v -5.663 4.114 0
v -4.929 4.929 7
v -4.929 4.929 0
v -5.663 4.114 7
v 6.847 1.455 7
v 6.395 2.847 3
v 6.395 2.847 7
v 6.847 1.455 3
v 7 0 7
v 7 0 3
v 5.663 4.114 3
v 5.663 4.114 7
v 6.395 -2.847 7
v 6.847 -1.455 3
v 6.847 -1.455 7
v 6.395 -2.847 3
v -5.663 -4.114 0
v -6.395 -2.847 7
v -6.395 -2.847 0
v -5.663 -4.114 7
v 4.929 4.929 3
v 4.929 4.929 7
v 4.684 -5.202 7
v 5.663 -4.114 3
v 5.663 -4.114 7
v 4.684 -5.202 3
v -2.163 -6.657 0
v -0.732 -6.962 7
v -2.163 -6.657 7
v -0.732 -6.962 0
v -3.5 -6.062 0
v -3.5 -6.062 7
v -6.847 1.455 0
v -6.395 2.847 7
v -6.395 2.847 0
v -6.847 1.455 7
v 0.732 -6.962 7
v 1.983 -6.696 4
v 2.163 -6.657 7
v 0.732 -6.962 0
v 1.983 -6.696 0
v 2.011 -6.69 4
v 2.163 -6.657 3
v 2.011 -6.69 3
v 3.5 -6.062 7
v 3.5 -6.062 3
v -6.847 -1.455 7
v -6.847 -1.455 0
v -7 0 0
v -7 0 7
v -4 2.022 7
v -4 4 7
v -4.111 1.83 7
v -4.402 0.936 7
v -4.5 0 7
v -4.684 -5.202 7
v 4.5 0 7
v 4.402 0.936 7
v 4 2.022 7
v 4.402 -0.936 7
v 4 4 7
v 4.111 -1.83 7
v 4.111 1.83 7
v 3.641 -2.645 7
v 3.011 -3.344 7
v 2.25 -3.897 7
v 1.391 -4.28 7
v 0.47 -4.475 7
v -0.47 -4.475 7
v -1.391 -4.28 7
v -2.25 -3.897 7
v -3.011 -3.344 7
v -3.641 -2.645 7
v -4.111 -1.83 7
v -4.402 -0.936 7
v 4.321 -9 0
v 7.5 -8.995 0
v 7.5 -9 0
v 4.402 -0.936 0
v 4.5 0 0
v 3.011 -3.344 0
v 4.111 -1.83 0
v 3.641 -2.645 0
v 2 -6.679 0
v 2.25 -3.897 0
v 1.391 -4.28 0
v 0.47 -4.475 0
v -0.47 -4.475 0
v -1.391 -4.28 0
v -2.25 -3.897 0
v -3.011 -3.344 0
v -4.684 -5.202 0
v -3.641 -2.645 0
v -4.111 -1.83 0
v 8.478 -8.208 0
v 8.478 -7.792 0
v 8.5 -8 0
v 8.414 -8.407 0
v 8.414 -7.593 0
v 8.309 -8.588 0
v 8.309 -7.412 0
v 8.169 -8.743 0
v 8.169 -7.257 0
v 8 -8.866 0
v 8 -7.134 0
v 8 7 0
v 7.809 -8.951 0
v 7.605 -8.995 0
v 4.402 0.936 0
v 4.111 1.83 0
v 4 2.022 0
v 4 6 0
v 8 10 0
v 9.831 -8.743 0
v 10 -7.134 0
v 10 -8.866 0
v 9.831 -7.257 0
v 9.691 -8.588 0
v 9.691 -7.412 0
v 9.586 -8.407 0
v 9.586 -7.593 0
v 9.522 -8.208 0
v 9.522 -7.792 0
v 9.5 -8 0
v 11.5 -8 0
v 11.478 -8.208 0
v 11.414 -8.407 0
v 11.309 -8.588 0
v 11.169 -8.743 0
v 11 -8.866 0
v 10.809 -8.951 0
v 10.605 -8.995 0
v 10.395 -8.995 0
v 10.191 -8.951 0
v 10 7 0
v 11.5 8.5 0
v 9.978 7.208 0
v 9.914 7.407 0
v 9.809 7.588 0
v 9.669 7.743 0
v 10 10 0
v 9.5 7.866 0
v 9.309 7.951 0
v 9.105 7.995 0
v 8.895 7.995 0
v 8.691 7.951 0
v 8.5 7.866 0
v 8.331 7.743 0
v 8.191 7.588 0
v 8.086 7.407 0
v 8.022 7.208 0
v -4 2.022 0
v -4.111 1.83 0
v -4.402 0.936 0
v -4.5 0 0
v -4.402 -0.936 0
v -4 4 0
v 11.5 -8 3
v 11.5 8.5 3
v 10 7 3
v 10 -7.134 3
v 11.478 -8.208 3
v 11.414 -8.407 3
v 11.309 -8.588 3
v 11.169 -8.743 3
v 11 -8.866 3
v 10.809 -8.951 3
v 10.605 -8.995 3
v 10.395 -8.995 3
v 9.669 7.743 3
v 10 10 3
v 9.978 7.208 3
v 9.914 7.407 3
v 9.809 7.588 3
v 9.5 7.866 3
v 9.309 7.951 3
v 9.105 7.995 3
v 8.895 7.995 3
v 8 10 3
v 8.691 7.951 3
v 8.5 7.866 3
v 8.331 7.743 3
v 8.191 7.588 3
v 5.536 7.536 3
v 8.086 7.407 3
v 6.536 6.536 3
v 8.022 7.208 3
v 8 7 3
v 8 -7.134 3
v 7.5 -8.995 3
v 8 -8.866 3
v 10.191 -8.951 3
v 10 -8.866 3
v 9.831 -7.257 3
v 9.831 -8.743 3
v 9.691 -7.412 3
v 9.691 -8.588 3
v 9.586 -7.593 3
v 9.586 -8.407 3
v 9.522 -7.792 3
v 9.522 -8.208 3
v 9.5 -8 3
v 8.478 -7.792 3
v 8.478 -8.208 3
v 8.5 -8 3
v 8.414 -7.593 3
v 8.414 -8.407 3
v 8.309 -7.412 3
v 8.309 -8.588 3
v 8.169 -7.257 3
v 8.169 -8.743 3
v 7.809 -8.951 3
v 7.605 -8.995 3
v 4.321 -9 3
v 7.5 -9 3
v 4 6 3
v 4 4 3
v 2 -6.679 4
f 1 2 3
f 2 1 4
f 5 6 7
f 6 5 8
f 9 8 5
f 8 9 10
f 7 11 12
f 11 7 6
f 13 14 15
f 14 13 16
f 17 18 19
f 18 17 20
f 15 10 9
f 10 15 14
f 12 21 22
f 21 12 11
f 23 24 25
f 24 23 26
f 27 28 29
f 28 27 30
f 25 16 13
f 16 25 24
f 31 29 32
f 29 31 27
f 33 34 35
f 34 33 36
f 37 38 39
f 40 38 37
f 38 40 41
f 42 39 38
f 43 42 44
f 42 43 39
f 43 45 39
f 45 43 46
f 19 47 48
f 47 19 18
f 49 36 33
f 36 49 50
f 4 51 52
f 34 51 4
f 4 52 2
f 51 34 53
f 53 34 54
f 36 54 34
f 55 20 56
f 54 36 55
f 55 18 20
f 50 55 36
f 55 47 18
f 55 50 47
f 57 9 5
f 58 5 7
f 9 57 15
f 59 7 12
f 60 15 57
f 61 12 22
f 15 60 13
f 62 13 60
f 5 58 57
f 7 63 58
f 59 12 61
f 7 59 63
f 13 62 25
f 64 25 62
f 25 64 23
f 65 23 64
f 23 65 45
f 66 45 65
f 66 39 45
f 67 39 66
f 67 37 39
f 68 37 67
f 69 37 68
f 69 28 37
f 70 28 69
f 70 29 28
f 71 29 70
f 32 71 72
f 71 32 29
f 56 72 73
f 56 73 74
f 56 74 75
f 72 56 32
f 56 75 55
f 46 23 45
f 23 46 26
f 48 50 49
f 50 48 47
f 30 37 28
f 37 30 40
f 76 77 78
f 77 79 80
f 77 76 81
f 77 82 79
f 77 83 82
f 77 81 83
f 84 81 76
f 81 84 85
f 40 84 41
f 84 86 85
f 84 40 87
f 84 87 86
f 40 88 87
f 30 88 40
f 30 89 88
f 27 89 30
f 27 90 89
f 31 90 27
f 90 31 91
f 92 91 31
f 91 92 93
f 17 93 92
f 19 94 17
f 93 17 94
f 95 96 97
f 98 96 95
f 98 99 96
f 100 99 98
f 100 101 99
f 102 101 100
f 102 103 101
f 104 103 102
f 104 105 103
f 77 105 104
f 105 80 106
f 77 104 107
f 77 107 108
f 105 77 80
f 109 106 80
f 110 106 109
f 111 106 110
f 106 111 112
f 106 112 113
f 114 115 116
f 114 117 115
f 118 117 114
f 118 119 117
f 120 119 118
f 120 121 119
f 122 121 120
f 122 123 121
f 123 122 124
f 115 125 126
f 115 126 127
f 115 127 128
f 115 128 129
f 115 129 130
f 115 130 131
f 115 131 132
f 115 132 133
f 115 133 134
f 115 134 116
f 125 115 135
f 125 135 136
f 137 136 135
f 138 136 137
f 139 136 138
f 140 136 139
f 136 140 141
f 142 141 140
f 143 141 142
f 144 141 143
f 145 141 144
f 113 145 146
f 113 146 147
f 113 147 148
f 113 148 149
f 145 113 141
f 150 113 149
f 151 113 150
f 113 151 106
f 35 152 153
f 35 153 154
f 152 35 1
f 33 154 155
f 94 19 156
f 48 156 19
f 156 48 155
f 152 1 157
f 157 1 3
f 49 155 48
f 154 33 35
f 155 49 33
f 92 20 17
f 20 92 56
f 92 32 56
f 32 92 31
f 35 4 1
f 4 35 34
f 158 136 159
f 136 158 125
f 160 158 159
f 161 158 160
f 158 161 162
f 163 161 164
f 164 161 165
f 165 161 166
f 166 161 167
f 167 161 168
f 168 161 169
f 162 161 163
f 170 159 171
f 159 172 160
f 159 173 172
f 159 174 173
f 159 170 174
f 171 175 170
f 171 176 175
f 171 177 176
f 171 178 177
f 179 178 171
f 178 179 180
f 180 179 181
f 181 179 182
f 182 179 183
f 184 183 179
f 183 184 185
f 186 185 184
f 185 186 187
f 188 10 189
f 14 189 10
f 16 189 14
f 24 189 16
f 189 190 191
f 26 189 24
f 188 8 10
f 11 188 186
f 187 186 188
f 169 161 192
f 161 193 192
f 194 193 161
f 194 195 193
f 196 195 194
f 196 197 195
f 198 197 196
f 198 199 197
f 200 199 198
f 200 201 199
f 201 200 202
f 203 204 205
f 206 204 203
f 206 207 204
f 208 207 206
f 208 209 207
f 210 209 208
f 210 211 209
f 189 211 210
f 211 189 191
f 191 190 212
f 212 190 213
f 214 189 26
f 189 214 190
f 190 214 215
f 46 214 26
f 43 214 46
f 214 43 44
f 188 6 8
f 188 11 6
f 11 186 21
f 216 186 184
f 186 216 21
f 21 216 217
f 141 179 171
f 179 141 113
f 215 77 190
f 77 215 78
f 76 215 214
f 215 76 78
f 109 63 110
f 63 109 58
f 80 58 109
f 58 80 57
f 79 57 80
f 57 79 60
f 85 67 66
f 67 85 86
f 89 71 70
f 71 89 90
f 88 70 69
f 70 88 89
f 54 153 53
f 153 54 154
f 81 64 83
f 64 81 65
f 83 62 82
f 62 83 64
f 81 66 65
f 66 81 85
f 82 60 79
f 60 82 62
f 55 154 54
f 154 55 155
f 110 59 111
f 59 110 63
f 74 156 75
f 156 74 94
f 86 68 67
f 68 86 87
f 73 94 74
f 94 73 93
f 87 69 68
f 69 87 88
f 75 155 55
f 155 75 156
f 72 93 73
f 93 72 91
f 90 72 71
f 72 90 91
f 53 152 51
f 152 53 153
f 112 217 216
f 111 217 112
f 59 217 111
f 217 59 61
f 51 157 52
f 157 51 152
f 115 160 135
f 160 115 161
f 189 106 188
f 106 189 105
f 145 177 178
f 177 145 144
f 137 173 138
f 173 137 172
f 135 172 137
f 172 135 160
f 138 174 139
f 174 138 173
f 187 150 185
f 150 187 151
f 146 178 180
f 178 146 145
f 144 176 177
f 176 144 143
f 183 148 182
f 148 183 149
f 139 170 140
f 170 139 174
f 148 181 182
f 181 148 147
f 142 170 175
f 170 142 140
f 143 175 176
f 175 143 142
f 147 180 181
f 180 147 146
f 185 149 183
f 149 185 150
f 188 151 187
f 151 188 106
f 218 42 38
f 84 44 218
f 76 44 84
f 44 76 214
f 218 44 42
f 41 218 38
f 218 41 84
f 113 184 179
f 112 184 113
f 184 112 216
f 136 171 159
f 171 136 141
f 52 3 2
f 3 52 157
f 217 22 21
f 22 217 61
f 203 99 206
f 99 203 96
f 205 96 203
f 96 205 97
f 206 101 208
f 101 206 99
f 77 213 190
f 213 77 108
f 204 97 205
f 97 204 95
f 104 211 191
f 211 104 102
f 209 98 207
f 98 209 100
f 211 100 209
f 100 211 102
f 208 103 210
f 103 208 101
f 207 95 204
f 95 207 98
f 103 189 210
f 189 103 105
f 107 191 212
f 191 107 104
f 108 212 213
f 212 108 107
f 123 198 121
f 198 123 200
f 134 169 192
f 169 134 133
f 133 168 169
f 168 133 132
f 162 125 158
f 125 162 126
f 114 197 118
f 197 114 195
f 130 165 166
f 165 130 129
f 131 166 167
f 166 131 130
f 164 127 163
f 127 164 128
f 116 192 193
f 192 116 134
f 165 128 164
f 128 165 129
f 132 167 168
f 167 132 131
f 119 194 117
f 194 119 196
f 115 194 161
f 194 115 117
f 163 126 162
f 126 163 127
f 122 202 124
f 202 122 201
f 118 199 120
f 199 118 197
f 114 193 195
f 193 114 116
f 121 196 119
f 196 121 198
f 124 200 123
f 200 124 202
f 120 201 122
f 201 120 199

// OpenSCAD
// PRUSA iteration3
// LCD cable clip
// GNU GPL v3
// Josef Průša <iam@josefprusa.cz> and contributors
// http://www.reprap.org/wiki/Prusa_Mendel
// http://prusamendel.org

isMetric=false;

difference(){
    union(){
    cylinder(r=7,h = 7, $fn=30);
    translate([2,-8,0]) cube([9.5,18,3]);
    translate([2,-9,0]) cube([5.5,5,3]);
    }
if(isMetric) {
  translate([0,0,-1]) cylinder(r=5,h = 10, $fn=30);
  translate([-4.5,0,-5]) cube([9,15,15]);
} else {
  translate([0,0,-1]) cylinder(r=4.5,h = 10, $fn=30);
  translate([-4,0,-5]) cube([8,15,15]);
}
translate([8,-12,-1]) cube([2,19,5]);
translate([9,7,-1]) cylinder(r=1,h = 5, $fn=30);
    
    //corners
    translate([2,-13.75,-1]) rotate([0,0,45]) cube([5,5,5]);    
    
    translate([4,6,-1]) rotate([0,0,45]) cube([10,10,5]);    
    translate([14,6,-1]) rotate([0,0,45]) cube([10,10,5]);    
    translate([-3,3,-1]) rotate([0,0,45]) cube([5,5,10]);    
    translate([3,3,3]) rotate([0,0,45]) cube([5,5,10]);    
}


translate([7.5,-8,0]) cylinder(r=1,h = 3, $fn=30);
translate([10.5,-8,0]) cylinder(r=1,h = 3, $fn=30);
